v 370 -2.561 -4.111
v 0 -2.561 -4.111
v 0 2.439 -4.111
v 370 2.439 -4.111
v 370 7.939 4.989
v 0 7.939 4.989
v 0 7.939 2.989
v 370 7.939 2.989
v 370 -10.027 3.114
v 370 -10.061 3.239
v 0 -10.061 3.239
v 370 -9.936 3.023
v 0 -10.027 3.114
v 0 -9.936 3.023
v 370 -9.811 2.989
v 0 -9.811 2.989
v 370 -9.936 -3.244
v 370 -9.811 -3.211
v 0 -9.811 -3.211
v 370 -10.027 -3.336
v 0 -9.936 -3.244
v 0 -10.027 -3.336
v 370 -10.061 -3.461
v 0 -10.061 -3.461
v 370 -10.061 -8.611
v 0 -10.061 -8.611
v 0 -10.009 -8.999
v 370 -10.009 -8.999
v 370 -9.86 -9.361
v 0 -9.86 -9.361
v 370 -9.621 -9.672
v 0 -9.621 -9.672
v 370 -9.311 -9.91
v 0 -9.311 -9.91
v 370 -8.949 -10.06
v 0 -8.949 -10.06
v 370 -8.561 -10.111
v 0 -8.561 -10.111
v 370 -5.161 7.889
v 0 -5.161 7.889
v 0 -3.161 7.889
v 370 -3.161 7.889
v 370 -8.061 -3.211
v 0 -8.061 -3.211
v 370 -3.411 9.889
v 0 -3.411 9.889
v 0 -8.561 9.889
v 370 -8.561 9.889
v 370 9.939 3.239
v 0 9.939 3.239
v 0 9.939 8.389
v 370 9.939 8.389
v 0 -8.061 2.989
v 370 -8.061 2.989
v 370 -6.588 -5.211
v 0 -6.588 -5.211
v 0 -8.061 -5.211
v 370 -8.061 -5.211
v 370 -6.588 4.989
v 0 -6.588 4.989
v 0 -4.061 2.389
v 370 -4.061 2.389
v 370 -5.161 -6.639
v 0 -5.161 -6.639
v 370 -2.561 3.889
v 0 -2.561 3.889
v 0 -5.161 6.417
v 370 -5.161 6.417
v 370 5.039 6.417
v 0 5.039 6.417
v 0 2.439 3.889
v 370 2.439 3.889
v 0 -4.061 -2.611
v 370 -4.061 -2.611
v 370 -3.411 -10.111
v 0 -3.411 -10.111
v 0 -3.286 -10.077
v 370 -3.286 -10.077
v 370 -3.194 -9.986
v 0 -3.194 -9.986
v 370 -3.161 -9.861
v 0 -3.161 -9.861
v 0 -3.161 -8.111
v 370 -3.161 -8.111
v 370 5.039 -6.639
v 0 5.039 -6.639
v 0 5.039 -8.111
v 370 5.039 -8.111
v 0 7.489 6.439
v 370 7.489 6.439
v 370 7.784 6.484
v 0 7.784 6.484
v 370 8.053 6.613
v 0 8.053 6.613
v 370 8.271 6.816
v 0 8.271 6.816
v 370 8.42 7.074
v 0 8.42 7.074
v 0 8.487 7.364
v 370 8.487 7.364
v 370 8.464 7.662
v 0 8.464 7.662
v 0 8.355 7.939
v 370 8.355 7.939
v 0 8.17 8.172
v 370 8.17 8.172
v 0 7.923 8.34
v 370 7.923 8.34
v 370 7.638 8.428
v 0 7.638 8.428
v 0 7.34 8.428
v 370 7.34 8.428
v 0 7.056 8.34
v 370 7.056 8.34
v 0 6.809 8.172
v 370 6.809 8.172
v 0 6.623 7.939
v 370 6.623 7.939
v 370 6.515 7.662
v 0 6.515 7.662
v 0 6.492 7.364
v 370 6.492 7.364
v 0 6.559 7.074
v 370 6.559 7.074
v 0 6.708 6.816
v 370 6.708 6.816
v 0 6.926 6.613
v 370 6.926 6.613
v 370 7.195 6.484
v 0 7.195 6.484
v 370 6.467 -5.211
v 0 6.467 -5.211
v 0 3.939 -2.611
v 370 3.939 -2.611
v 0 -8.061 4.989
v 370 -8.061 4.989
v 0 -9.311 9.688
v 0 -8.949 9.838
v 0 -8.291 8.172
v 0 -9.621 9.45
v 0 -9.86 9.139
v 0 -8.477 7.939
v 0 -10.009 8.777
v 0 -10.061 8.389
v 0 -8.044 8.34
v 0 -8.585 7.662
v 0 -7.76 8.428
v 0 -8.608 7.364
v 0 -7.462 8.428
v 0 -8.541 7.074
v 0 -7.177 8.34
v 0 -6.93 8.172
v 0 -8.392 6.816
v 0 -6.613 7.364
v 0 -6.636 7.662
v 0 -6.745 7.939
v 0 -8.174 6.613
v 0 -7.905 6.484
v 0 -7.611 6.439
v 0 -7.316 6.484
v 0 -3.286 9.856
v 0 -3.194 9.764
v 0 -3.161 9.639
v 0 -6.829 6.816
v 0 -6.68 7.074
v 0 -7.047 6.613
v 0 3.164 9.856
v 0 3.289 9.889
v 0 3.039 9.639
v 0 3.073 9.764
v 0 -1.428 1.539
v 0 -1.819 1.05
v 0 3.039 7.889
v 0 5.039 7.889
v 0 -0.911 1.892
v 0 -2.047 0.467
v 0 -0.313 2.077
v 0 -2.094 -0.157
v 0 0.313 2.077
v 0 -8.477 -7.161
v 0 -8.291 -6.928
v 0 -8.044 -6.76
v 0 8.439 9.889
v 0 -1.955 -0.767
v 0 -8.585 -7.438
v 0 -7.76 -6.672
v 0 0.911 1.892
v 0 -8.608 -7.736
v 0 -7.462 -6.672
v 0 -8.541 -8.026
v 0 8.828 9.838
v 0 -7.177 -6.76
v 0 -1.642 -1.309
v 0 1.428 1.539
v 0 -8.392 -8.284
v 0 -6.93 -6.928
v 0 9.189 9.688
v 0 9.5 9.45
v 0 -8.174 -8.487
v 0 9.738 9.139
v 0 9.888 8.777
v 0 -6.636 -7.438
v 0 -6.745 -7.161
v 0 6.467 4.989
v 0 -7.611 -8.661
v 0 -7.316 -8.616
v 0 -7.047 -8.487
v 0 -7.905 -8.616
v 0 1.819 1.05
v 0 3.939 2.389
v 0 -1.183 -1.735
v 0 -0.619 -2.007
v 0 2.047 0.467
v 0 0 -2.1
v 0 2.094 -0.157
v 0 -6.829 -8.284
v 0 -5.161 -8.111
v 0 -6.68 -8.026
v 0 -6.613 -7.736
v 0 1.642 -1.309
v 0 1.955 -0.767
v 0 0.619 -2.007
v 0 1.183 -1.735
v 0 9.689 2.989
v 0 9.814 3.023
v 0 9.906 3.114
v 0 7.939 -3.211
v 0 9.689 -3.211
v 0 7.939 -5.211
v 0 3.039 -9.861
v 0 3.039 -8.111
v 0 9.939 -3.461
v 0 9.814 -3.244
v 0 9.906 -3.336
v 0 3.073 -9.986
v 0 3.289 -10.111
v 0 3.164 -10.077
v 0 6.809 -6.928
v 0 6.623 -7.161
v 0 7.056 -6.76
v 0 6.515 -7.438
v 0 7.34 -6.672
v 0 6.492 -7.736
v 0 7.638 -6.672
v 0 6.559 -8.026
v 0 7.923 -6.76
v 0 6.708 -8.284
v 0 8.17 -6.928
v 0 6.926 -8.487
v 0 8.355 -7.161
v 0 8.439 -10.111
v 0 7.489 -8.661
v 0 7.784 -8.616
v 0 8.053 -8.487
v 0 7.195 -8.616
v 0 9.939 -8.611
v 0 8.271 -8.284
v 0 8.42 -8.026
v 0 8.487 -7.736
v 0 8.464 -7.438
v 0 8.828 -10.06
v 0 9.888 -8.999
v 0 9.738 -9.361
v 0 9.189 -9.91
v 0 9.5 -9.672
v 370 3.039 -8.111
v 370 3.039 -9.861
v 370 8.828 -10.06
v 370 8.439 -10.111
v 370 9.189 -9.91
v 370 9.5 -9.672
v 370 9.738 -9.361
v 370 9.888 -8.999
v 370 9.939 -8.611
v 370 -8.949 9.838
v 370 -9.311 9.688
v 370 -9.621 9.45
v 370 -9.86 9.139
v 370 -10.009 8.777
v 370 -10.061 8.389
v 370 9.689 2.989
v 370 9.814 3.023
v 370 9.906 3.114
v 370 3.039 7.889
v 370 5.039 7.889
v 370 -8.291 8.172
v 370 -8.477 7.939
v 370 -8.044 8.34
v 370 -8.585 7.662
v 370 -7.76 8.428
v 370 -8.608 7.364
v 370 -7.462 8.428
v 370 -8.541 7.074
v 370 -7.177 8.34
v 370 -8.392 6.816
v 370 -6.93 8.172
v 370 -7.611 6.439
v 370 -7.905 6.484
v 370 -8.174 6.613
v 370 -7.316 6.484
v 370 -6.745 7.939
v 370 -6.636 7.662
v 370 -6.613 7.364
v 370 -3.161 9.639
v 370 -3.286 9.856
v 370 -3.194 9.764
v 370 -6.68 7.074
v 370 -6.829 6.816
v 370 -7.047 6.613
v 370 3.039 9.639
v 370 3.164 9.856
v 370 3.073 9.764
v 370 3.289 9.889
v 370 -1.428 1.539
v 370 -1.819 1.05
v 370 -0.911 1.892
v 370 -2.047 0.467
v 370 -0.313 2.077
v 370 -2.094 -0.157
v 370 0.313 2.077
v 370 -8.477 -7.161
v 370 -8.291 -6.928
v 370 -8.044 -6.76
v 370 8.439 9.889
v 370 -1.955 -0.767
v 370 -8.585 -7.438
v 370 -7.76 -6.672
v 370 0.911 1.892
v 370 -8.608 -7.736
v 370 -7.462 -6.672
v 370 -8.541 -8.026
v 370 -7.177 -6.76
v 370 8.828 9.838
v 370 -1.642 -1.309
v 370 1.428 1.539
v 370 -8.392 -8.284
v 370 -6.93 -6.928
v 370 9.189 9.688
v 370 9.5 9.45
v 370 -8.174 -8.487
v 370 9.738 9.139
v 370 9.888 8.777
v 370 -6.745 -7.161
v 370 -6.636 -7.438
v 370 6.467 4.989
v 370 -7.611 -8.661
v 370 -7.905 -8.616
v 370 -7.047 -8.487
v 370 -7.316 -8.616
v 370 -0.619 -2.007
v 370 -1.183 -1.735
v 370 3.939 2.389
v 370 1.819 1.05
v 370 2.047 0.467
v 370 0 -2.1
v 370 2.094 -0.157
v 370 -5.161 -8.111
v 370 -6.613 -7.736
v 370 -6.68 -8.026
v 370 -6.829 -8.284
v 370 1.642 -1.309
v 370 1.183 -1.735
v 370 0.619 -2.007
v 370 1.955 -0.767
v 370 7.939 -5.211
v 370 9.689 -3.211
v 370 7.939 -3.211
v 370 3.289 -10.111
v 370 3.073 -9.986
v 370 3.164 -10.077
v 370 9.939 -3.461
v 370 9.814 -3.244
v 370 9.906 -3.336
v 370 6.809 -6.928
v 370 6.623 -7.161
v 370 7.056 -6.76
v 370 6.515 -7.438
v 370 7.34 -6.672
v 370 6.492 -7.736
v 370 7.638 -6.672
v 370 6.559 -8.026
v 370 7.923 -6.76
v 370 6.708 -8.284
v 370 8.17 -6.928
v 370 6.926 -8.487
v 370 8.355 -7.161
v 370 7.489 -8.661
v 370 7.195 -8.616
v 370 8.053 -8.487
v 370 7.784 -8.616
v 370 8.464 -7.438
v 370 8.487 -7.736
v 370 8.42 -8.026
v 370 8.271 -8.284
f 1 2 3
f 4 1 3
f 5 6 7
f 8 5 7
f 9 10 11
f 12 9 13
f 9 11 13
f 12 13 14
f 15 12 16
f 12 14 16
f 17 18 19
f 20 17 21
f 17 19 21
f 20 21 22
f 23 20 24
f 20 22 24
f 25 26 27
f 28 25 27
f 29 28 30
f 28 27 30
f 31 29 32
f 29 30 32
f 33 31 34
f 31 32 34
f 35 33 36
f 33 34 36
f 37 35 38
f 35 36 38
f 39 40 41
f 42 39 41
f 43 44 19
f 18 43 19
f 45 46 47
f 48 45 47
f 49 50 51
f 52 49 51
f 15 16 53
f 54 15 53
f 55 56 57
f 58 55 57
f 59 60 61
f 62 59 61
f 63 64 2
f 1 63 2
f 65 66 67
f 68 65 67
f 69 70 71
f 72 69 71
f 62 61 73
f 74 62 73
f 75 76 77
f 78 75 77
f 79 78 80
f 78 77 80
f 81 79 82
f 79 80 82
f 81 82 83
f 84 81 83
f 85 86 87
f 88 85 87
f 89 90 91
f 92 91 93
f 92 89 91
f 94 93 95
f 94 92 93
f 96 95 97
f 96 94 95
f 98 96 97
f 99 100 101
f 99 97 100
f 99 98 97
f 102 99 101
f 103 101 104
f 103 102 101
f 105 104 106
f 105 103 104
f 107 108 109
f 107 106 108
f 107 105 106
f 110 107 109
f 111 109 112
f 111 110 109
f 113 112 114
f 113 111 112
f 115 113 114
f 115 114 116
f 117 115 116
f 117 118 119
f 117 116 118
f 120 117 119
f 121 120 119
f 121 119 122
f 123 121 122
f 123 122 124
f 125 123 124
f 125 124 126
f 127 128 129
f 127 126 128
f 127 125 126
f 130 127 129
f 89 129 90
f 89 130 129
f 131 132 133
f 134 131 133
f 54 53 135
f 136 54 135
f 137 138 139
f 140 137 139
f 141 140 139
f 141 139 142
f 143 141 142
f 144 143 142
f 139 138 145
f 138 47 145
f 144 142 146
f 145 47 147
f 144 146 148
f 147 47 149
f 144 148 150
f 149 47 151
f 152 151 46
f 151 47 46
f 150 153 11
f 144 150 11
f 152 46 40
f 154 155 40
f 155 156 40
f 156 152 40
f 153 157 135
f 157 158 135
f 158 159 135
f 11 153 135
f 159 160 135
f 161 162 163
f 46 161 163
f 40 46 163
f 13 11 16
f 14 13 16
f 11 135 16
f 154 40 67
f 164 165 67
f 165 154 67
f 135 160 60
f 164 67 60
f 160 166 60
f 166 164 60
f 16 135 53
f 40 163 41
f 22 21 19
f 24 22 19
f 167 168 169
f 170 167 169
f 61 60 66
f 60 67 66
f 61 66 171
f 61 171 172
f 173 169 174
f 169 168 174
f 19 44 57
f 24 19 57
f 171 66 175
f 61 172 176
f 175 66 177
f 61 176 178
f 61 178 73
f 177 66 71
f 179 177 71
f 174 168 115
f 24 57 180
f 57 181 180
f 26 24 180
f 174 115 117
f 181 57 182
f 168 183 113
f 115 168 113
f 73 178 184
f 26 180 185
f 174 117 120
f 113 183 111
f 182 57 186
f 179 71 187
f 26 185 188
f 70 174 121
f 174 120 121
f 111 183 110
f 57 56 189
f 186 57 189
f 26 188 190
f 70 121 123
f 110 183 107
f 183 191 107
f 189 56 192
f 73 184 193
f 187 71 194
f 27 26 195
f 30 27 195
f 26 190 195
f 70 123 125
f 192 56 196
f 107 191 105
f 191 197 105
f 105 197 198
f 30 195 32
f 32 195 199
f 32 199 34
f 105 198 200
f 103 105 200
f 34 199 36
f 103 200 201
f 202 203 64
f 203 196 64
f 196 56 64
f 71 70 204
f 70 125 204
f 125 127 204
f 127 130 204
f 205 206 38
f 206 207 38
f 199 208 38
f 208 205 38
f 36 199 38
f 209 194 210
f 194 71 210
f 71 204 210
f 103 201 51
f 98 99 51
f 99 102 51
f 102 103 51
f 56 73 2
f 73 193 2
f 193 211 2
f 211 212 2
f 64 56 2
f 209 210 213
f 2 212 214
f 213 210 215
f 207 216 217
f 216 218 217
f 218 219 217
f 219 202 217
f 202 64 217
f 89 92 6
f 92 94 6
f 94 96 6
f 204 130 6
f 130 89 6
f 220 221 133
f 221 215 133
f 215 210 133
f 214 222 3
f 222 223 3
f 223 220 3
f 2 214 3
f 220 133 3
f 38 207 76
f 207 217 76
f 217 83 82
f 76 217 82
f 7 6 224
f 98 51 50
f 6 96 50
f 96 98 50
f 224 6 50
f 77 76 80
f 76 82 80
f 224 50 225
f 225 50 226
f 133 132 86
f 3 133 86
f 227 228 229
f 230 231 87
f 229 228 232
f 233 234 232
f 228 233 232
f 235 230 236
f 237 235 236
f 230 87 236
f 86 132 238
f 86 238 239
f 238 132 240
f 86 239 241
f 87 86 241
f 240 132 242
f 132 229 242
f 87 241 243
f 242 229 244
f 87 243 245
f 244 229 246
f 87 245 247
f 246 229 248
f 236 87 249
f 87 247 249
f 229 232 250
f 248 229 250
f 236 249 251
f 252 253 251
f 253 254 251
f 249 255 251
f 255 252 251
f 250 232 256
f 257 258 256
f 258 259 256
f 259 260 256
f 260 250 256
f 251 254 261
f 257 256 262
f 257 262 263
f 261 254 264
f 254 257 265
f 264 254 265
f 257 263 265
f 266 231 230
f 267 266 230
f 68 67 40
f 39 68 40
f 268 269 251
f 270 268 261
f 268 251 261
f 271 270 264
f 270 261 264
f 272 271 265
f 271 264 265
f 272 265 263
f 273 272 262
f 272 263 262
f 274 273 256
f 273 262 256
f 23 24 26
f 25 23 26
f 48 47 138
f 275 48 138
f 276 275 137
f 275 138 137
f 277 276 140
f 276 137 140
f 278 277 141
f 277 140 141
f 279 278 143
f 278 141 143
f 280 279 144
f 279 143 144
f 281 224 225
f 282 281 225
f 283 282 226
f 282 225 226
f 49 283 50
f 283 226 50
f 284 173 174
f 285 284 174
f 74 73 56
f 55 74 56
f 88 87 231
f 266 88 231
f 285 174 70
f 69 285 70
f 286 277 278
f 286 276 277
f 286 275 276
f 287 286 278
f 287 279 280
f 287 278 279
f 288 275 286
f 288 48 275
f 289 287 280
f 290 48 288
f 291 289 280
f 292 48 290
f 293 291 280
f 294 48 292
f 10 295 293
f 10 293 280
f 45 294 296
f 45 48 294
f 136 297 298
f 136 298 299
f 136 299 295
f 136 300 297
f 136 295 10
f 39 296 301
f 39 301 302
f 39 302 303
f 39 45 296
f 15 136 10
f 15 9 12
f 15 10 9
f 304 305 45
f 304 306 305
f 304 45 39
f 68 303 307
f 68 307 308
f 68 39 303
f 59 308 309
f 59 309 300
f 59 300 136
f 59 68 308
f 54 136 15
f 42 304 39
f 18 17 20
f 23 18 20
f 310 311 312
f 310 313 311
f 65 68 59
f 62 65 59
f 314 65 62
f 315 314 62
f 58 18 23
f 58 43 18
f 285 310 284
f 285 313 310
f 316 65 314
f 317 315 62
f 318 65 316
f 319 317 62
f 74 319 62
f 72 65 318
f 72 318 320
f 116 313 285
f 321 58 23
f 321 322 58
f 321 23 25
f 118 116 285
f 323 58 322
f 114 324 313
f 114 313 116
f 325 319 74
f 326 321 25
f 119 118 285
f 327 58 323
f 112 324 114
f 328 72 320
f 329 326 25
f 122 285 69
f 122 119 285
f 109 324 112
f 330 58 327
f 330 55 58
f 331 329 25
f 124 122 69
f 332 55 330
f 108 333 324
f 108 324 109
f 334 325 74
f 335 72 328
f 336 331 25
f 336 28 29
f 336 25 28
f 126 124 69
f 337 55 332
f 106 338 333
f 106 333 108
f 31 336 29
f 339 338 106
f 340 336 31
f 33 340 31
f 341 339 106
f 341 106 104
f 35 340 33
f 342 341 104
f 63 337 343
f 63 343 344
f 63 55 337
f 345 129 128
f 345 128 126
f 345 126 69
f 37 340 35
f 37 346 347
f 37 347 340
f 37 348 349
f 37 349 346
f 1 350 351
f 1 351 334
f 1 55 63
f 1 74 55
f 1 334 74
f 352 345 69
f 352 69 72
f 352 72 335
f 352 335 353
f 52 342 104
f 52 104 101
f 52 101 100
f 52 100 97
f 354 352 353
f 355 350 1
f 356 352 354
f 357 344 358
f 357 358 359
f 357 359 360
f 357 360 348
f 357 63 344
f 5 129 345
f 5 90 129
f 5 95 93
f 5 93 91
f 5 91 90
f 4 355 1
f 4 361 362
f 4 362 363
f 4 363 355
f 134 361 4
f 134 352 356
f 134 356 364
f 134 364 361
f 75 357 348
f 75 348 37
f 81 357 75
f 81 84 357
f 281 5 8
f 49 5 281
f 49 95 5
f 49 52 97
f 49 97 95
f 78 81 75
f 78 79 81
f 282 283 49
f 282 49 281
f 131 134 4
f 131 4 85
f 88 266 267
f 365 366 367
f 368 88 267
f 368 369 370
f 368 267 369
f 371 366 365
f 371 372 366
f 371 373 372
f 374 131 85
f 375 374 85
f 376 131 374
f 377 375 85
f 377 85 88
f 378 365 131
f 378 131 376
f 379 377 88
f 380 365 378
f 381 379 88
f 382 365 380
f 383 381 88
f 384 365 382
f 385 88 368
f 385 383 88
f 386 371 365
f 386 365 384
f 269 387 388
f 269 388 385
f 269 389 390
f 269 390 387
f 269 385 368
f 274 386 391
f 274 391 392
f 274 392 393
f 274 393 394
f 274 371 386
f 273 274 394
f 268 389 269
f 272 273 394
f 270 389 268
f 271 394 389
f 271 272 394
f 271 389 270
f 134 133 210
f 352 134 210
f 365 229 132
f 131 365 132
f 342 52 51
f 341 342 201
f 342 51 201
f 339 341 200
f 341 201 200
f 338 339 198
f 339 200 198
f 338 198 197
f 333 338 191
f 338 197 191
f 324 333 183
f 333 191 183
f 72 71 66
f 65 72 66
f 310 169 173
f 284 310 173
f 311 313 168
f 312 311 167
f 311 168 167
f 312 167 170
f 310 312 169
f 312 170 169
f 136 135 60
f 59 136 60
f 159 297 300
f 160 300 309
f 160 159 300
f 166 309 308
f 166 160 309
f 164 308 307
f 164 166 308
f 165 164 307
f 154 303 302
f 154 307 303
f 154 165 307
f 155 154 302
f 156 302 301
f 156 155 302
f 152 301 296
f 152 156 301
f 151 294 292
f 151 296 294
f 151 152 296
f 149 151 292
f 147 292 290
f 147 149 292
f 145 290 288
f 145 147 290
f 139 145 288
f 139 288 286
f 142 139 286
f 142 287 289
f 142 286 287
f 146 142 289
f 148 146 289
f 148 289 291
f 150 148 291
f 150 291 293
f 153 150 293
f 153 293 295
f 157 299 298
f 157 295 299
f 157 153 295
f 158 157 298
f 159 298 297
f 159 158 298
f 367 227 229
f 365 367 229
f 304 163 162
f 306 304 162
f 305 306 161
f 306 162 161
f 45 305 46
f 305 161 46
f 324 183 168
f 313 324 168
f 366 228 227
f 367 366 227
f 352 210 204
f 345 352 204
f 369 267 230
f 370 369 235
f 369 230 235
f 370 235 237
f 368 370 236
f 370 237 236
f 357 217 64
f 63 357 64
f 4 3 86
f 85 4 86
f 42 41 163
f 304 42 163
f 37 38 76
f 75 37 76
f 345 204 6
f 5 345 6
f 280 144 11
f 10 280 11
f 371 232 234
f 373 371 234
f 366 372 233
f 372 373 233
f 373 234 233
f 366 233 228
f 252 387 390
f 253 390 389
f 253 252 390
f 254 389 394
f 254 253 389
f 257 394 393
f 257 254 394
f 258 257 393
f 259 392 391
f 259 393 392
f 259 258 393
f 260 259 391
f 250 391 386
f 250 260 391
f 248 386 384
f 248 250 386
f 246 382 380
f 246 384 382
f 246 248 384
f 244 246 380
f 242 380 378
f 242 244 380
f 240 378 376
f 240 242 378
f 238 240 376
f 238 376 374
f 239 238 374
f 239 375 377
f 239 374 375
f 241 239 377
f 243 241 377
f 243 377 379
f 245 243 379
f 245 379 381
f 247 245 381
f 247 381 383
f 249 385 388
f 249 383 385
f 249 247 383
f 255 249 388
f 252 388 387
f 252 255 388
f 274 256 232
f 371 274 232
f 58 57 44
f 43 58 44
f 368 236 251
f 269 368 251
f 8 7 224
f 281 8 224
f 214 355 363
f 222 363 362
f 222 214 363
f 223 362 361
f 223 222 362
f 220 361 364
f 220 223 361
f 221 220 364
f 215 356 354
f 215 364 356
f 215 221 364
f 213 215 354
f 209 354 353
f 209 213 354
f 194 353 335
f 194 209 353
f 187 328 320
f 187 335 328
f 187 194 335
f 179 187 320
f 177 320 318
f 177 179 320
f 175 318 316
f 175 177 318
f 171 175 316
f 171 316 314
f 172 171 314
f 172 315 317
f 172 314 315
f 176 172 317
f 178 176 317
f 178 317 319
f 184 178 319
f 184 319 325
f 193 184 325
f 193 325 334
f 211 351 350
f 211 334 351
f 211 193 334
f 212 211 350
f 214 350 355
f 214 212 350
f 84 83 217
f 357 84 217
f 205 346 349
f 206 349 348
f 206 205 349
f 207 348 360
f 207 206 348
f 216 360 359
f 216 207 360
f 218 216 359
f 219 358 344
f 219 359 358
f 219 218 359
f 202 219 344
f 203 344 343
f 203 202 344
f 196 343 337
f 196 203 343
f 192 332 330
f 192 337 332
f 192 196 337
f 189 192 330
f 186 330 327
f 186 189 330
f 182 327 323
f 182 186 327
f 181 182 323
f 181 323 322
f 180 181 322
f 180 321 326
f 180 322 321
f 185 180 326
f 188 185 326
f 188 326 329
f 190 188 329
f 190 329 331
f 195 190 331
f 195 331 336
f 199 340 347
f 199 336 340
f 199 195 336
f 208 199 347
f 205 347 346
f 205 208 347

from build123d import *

# Parameters (mm, degrees)
SKETCH11_R          = 1
SKETCH11_R_2        = 2.1
XA_XA_2020T_1_DEPTH = 400
SKETCH14_W          = 25.965356462
SKETCH14_H          = 24.672555304
CUT_EXTRUDE2_DEPTH  = 30


with BuildPart() as part:
    # Sketch11 → Xa XA-2020T(1) (new body)
    with BuildSketch(Plane(origin=(0, 0, 0), x_dir=(0, 0, -1), z_dir=(1, 0, 0))):
        with BuildLine():
            Line((-9.889124212, 8.439448346), (-9.889124212, 3.289448346))
            ThreePointArc((-9.889124212, 3.289448346), (-9.815900907, 3.112671651), (-9.639124212, 3.039448346))
            Line((-9.639124212, 3.039448346), (-7.889124212, 3.039448346))
            Line((-7.889124212, 3.039448346), (-7.889124212, 5.039448346))
            Line((-7.889124212, 5.039448346), (-6.41690199, 5.039448346))
            Line((-6.41690199, 5.039448346), (-3.889124212, 2.439448346))
            Line((-3.889124212, 2.439448346), (-3.889124212, -2.560551654))
            Line((-3.889124212, -2.560551654), (-6.41690199, -5.160551654))
            Line((-6.41690199, -5.160551654), (-7.889124212, -5.160551654))
            Line((-7.889124212, -5.160551654), (-7.889124212, -3.160551654))
            Line((-7.889124212, -3.160551654), (-9.639124212, -3.160551654))
            ThreePointArc((-9.639124212, -3.160551654), (-9.815900907, -3.233774958), (-9.889124212, -3.410551654))
            Line((-9.889124212, -3.410551654), (-9.889124212, -8.560551654))
            ThreePointArc((-9.889124212, -8.560551654), (-9.449784384, -9.621211825), (-8.389124212, -10.060551654))
            Line((-8.389124212, -10.060551654), (-3.239124212, -10.060551654))
            ThreePointArc((-3.239124212, -10.060551654), (-3.062347516, -9.987328349), (-2.989124212, -9.810551654))
            Line((-2.989124212, -9.810551654), (-2.989124212, -8.060551654))
            Line((-2.989124212, -8.060551654), (-4.989124212, -8.060551654))
            Line((-4.989124212, -8.060551654), (-4.989124212, -6.588329431))
            Line((-4.989124212, -6.588329431), (-2.389124212, -4.060551654))
            Line((-2.389124212, -4.060551654), (2.610875788, -4.060551654))
            Line((2.610875788, -4.060551654), (5.210875788, -6.588329431))
            Line((5.210875788, -6.588329431), (5.210875788, -8.060551654))
            Line((5.210875788, -8.060551654), (3.210875788, -8.060551654))
            Line((3.210875788, -8.060551654), (3.210875788, -9.810551654))
            ThreePointArc((3.210875788, -9.810551654), (3.284099093, -9.987328349), (3.460875788, -10.060551654))
            Line((3.460875788, -10.060551654), (8.610875788, -10.060551654))
            ThreePointArc((8.610875788, -10.060551654), (9.67153596, -9.621211825), (10.110875788, -8.560551654))
            Line((10.110875788, -8.560551654), (10.110875788, -3.410551654))
            ThreePointArc((10.110875788, -3.410551654), (10.037652484, -3.233774958), (9.860875788, -3.160551654))
            Line((9.860875788, -3.160551654), (8.110875788, -3.160551654))
            Line((8.110875788, -3.160551654), (8.110875788, -5.160551654))
            Line((8.110875788, -5.160551654), (6.638653566, -5.160551654))
            Line((6.638653566, -5.160551654), (4.110875788, -2.560551654))
            Line((4.110875788, -2.560551654), (4.110875788, 2.439448346))
            Line((4.110875788, 2.439448346), (6.638653566, 5.039448346))
            Line((6.638653566, 5.039448346), (8.110875788, 5.039448346))
            Line((8.110875788, 5.039448346), (8.110875788, 3.039448346))
            Line((8.110875788, 3.039448346), (9.860875788, 3.039448346))
            ThreePointArc((9.860875788, 3.039448346), (10.037652484, 3.112671651), (10.110875788, 3.289448346))
            Line((10.110875788, 3.289448346), (10.110875788, 8.439448346))
            ThreePointArc((10.110875788, 8.439448346), (9.67153596, 9.500108518), (8.610875788, 9.939448346))
            Line((8.610875788, 9.939448346), (3.460875788, 9.939448346))
            ThreePointArc((3.460875788, 9.939448346), (3.284099093, 9.866225042), (3.210875788, 9.689448346))
            Line((3.210875788, 9.689448346), (3.210875788, 7.939448346))
            Line((3.210875788, 7.939448346), (5.210875788, 7.939448346))
            Line((5.210875788, 7.939448346), (5.210875788, 6.467226124))
            Line((5.210875788, 6.467226124), (2.610875788, 3.939448346))
            Line((2.610875788, 3.939448346), (-2.389124212, 3.939448346))
            Line((-2.389124212, 3.939448346), (-4.989124212, 6.467226124))
            Line((-4.989124212, 6.467226124), (-4.989124212, 7.939448346))
            Line((-4.989124212, 7.939448346), (-2.989124212, 7.939448346))
            Line((-2.989124212, 7.939448346), (-2.989124212, 9.689448346))
            ThreePointArc((-2.989124212, 9.689448346), (-3.062347516, 9.866225042), (-3.239124212, 9.939448346))
            Line((-3.239124212, 9.939448346), (-8.389124212, 9.939448346))
            ThreePointArc((-8.389124212, 9.939448346), (-9.449784384, 9.500108518), (-9.889124212, 8.439448346))
        make_face()
        with Locations((-7.439124212, 7.489448346)):
            Circle(SKETCH11_R, mode=Mode.SUBTRACT)
        with Locations((7.660875788, 7.489448346)):
            Circle(SKETCH11_R, mode=Mode.SUBTRACT)
        with Locations((-7.439124212, -7.610551654)):
            Circle(SKETCH11_R, mode=Mode.SUBTRACT)
        with Locations((7.660875788, -7.610551654)):
            Circle(SKETCH11_R, mode=Mode.SUBTRACT)
        Circle(SKETCH11_R_2, mode=Mode.SUBTRACT)
    extrude(amount=XA_XA_2020T_1_DEPTH)

    # Sketch14 → Cut-Extrude2 (cut)
    with BuildSketch(Plane(origin=(400, 0, 0), x_dir=(0, 0, -1), z_dir=(1, 0, 0))):
        Rectangle(SKETCH14_W, SKETCH14_H)
    extrude(amount=-CUT_EXTRUDE2_DEPTH, mode=Mode.SUBTRACT)


solid = part.part
